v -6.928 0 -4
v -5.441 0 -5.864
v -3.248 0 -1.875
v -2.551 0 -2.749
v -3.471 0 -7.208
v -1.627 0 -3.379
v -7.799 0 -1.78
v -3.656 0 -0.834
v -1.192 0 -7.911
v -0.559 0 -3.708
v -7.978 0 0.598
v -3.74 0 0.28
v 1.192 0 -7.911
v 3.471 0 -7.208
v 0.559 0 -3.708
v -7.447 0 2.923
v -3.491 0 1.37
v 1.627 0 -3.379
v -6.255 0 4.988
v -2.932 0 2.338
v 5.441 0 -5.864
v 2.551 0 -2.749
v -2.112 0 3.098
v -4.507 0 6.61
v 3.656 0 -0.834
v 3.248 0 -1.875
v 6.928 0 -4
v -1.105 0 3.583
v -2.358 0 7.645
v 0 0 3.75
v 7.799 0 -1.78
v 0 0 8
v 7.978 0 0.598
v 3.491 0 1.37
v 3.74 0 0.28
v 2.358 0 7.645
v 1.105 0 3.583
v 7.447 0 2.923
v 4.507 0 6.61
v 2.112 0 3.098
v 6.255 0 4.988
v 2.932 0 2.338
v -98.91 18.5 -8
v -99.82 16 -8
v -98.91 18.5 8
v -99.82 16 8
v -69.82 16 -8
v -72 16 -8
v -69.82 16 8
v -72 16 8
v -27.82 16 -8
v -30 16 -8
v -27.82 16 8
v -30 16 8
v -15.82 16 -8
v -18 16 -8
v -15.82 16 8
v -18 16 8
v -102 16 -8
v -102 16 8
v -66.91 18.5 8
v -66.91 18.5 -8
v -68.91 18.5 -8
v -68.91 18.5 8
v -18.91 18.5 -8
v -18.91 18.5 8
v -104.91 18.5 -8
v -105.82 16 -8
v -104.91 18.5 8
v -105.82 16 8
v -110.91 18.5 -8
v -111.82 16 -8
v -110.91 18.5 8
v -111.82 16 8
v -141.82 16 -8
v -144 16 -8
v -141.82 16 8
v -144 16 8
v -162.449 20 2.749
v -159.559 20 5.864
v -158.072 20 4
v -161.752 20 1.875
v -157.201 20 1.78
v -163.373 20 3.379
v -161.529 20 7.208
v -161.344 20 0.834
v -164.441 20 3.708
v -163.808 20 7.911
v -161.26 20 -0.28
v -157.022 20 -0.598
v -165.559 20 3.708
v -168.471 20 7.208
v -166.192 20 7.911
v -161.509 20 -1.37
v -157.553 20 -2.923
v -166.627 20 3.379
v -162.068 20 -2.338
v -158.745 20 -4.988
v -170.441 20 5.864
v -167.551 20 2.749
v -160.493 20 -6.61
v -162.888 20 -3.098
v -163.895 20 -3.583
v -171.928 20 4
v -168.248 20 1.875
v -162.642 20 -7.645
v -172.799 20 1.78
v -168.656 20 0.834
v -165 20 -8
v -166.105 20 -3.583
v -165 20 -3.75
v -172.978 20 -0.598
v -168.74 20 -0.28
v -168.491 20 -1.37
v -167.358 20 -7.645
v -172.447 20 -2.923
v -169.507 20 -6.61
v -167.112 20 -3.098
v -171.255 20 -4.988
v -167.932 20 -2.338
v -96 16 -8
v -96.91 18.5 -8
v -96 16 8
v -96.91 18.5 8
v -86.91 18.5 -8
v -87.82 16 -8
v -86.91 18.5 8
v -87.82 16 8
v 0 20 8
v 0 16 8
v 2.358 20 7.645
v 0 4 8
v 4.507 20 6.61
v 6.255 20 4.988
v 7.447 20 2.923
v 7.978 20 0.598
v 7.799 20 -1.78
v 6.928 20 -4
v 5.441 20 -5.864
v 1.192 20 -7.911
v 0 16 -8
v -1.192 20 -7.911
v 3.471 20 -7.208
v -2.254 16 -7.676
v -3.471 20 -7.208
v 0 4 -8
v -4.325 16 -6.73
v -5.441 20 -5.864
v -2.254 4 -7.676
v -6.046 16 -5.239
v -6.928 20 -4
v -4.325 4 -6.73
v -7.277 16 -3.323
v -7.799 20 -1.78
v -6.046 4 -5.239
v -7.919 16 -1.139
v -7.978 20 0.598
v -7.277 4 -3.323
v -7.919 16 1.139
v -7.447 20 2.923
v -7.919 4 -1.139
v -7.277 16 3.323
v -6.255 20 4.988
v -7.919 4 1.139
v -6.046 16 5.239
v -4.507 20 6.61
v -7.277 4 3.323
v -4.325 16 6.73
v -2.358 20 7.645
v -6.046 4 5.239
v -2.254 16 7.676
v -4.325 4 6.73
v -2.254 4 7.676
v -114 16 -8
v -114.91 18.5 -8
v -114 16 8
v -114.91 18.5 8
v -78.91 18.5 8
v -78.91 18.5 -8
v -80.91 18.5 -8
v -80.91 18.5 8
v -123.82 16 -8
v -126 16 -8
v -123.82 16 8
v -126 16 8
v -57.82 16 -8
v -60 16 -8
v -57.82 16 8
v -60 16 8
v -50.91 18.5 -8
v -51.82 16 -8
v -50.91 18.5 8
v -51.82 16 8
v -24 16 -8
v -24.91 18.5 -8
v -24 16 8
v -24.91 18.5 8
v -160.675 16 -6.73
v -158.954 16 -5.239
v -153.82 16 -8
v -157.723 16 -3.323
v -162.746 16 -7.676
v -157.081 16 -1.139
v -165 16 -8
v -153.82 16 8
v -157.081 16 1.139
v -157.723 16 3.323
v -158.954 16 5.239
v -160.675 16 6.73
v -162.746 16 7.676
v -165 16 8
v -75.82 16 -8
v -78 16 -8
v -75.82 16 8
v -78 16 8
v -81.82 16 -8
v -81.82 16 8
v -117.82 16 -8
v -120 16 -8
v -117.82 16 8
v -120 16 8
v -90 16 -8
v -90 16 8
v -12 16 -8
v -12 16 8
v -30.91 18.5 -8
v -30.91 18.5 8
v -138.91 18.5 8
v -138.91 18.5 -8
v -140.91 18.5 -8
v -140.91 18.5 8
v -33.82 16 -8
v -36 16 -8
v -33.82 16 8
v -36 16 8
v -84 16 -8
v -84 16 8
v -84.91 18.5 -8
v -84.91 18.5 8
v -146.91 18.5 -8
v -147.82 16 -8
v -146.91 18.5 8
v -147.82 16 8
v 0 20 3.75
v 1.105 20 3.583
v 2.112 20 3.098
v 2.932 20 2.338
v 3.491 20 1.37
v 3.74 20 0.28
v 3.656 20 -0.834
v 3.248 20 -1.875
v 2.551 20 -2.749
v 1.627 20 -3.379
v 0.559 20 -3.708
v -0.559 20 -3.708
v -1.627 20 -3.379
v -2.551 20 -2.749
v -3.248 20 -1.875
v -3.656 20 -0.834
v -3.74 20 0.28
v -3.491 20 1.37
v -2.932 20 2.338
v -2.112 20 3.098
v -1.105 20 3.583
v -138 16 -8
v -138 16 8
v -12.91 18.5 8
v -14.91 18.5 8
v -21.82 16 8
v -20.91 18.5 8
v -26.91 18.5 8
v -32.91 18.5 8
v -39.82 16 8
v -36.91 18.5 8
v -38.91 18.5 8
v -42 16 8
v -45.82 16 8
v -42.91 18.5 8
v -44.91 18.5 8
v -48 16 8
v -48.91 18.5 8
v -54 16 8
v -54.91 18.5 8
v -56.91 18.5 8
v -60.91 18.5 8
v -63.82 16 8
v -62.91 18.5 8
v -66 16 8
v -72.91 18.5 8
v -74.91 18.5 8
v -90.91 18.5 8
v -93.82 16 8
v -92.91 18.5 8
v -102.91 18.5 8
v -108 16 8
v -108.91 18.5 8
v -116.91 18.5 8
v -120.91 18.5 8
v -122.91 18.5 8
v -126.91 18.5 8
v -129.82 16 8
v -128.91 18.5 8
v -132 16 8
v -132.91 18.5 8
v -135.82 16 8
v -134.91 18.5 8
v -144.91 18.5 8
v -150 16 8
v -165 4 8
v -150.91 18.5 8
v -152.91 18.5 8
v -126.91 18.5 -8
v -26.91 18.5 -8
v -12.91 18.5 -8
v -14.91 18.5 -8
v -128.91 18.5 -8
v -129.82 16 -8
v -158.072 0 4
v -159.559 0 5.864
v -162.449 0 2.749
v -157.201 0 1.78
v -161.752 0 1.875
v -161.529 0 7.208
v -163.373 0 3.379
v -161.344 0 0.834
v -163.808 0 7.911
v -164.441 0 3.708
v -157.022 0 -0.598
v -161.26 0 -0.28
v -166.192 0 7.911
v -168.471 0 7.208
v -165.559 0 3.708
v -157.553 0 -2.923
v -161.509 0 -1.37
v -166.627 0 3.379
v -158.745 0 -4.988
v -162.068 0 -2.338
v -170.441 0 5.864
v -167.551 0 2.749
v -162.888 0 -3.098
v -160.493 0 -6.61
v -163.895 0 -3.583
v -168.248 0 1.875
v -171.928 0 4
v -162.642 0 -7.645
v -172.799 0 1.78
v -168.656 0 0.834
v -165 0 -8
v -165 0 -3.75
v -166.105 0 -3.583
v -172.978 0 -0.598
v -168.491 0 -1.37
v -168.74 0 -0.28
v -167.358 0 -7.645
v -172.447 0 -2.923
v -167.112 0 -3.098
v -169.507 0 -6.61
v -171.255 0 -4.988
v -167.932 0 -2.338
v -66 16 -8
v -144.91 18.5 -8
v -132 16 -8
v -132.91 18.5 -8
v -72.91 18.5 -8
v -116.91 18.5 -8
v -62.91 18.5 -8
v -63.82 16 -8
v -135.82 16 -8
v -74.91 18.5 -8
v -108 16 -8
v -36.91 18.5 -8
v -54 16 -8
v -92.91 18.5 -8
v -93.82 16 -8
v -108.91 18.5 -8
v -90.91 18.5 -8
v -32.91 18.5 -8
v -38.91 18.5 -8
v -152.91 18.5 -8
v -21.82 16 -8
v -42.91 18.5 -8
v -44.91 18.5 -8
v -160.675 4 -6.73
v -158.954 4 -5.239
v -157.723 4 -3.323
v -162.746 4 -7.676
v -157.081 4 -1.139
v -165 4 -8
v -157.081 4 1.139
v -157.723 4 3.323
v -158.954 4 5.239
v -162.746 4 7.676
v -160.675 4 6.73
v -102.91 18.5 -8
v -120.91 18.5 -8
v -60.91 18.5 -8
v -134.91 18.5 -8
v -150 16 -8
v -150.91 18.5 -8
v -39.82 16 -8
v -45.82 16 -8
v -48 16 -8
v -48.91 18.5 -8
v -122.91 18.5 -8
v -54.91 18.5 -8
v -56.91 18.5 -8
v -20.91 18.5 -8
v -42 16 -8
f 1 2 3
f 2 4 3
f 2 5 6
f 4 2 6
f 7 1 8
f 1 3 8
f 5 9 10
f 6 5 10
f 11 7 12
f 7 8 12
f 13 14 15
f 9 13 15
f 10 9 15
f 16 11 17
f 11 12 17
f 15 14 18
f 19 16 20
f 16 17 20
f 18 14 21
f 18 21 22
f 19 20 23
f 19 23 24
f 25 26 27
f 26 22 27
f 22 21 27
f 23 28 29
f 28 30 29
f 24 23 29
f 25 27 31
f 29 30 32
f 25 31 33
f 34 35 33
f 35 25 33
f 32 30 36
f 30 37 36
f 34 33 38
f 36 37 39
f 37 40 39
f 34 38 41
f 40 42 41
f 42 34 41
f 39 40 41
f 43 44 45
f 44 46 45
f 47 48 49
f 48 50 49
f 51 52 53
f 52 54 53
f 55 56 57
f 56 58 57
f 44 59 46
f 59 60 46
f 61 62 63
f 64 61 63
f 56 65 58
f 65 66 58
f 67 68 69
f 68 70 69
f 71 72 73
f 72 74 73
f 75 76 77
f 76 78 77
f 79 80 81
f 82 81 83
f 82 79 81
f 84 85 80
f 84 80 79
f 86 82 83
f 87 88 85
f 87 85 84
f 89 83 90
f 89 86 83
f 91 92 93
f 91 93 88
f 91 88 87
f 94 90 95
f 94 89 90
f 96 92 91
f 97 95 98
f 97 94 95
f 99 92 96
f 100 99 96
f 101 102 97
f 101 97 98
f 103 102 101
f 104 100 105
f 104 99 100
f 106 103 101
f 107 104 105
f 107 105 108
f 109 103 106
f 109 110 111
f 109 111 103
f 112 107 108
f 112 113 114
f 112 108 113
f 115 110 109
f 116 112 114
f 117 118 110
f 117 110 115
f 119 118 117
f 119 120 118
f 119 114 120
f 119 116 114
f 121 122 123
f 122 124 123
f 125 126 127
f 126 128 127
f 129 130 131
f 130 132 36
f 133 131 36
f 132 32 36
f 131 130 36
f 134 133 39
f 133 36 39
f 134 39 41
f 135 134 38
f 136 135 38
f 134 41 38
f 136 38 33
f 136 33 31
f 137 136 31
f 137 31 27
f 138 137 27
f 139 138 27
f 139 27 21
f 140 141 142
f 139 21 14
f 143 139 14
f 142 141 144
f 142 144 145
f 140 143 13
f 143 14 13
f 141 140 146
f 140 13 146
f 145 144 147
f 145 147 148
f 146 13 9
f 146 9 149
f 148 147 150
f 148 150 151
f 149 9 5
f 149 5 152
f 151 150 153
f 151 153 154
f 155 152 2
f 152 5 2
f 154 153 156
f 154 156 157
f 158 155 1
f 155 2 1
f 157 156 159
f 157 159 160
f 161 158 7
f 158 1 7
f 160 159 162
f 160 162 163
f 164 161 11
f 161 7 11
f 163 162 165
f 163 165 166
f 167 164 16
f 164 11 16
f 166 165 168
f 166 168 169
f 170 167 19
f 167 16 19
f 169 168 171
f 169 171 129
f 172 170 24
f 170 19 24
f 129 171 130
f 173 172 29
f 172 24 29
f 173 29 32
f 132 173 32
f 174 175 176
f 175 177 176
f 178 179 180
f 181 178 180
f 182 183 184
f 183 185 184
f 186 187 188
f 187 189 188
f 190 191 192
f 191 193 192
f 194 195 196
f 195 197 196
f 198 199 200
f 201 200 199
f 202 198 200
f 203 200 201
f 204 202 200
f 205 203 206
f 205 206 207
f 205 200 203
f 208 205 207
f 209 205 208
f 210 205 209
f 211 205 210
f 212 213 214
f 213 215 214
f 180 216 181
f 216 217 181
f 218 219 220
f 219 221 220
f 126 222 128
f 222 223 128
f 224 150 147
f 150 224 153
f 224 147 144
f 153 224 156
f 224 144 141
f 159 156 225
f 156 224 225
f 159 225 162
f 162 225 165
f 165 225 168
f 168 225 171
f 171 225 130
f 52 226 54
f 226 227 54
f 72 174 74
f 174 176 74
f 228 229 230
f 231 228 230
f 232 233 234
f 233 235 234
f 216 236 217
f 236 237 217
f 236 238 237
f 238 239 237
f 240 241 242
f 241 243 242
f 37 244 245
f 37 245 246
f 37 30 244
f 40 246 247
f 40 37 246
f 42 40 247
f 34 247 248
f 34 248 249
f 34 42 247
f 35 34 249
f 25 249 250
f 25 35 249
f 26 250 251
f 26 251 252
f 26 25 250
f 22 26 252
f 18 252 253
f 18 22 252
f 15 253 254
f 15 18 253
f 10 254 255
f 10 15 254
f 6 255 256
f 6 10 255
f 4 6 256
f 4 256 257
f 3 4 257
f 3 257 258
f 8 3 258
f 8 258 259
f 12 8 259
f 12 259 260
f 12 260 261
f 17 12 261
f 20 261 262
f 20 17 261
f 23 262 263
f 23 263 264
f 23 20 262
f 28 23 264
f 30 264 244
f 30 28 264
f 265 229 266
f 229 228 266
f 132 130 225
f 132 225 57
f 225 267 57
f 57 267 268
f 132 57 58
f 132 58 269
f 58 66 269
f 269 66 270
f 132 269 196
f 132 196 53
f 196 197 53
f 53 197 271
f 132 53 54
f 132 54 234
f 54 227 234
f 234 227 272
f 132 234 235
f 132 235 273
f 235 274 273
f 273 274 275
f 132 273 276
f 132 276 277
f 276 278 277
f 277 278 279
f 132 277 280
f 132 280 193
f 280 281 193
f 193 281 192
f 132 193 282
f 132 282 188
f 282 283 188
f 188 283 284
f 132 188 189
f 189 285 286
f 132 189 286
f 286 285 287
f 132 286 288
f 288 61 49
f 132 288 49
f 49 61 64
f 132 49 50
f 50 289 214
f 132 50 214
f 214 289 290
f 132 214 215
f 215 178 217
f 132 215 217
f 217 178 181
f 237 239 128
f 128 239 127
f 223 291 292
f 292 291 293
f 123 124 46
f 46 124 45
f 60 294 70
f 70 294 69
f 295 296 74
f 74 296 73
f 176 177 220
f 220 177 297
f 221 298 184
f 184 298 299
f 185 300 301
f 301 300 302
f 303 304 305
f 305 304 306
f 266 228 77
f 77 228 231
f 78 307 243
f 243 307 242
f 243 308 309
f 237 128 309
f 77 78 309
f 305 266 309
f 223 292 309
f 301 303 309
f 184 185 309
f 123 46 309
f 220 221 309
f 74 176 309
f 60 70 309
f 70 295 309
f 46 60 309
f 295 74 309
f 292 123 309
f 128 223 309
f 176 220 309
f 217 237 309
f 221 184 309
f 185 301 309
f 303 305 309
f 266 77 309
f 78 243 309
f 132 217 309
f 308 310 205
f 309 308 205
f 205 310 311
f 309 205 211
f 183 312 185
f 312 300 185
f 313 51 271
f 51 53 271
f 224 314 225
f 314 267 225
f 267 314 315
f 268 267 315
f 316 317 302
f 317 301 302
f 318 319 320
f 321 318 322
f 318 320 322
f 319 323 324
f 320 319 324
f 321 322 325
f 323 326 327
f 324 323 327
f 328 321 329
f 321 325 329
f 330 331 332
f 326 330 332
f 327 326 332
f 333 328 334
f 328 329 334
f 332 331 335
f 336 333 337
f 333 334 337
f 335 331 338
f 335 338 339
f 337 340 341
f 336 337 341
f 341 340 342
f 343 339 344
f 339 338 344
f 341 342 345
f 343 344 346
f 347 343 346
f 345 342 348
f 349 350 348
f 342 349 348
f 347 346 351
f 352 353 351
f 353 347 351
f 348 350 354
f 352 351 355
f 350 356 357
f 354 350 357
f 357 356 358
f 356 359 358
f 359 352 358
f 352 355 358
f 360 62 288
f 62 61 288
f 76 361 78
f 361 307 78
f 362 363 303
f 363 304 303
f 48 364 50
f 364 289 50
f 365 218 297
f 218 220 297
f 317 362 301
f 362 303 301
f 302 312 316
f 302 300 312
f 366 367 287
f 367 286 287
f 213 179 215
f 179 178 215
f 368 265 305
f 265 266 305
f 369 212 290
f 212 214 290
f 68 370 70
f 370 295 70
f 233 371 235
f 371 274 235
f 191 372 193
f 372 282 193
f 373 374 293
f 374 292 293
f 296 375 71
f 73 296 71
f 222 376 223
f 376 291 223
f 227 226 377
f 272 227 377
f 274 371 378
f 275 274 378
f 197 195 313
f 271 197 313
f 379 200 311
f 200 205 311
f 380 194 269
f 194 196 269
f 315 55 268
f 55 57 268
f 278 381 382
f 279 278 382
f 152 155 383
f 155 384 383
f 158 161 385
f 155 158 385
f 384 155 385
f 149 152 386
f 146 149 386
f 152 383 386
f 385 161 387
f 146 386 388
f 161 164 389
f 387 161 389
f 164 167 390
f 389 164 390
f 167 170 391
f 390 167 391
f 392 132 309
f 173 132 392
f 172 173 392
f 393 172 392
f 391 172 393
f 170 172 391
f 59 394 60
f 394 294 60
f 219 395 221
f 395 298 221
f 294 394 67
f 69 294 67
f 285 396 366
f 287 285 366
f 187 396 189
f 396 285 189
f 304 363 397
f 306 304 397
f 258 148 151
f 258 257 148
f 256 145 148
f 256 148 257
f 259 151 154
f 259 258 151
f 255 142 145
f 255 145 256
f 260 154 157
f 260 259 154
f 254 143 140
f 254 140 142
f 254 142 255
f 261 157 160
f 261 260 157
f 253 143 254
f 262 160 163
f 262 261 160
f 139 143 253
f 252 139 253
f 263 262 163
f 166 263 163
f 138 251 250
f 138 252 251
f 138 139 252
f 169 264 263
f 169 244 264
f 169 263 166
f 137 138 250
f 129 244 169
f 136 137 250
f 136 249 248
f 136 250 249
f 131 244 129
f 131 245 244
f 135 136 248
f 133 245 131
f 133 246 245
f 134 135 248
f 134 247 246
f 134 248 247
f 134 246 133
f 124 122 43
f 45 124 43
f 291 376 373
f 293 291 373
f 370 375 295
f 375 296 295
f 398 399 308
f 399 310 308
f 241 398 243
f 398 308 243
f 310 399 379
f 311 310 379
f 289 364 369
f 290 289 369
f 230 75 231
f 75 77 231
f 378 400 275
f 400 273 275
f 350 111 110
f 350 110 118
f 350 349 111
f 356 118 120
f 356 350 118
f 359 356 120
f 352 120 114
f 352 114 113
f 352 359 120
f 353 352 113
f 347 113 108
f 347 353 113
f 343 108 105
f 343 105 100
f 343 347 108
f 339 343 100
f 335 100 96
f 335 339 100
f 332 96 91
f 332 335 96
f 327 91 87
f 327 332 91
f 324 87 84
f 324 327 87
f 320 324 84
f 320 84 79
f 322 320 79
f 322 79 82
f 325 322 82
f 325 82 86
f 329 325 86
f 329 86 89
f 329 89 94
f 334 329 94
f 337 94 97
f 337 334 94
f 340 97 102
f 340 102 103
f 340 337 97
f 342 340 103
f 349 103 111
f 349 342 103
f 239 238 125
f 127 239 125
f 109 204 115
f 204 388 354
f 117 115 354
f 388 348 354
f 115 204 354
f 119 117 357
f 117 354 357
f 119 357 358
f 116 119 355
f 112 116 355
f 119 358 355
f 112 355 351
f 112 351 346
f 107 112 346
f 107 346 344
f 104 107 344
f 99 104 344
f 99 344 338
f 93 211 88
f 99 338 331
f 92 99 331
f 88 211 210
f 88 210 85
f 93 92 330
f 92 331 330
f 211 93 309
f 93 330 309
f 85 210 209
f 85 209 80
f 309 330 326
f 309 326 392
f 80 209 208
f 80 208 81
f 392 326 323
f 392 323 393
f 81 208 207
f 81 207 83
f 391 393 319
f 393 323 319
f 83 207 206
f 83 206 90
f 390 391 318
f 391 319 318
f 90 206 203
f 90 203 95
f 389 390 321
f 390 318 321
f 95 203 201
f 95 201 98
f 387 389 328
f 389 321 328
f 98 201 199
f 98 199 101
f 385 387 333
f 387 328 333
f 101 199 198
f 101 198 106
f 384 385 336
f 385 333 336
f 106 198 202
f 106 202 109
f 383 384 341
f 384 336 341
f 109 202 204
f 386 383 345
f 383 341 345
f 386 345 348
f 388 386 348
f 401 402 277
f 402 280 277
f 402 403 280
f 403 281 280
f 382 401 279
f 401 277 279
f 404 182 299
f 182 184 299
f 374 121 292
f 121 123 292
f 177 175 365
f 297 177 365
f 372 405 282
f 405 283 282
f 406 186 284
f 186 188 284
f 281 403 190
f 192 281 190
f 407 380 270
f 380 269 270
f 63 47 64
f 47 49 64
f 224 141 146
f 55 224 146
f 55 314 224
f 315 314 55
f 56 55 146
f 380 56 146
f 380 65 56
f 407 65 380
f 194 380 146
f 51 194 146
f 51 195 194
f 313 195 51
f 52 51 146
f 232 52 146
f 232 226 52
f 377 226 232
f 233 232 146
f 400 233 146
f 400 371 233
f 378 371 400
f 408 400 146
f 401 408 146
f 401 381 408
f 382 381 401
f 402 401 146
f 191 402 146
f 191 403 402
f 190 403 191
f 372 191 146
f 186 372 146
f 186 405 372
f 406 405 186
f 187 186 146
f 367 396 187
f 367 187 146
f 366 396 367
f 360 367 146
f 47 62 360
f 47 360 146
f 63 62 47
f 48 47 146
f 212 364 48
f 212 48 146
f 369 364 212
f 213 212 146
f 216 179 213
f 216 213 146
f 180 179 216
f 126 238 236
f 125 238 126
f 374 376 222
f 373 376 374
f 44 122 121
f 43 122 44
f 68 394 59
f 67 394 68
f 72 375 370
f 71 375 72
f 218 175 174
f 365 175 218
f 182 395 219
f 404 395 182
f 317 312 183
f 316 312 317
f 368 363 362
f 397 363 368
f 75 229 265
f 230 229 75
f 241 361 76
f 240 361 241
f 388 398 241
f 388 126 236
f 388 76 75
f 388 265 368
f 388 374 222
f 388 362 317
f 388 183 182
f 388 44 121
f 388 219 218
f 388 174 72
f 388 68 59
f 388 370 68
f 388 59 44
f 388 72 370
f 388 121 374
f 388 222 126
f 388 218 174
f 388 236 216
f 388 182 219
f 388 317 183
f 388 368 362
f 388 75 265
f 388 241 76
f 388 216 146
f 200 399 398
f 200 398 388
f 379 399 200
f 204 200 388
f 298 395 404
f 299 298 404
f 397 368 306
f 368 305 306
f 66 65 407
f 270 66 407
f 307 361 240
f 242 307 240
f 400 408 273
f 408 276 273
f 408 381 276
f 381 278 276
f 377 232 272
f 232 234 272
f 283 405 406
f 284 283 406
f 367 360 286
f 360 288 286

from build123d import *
from build123d.topology import SkipClean

# Parameters (mm, degrees)
SKETCH1_R             = 8
SKETCH1_R_2           = 3.75
BOSS_EXTRUDE1_DEPTH   = 20
BOSS_EXTRUDE1_2_DEPTH = 20
BOSS_EXTRUDE2_DEPTH   = 8
SKETCH1_4_R           = 8
SKETCH1_4_R_2         = 3.75
BOSS_EXTRUDE3_DEPTH   = 16
SKETCH3_R             = 3.75
CUT_EXTRUDE2_DEPTH    = 16
SKETCH4_R             = 3.75
CUT_EXTRUDE3_DEPTH    = 16


with BuildPart() as part:
    # Sketch1 → Boss-Extrude1 (new body)
    with BuildSketch(Plane(origin=(0, 0, 0), x_dir=(1, 0, 0), z_dir=(0, 1, 0))):
        Circle(SKETCH1_R)
        Circle(SKETCH1_R_2, mode=Mode.SUBTRACT)
    extrude(amount=BOSS_EXTRUDE1_DEPTH)



with BuildPart() as body_2:
    # Sketch1 → Boss-Extrude1 2 (new body)
    with BuildSketch(Plane(origin=(0, 0, 0), x_dir=(1, 0, 0), z_dir=(0, 1, 0))):
        with Locations((-165, 0)):
            Circle(SKETCH1_R)
        with Locations((-165, 0)):
            Circle(SKETCH1_R_2, mode=Mode.SUBTRACT)
    extrude(amount=BOSS_EXTRUDE1_2_DEPTH)


with BuildPart() as part_1:
    add(part.part)

    add(body_2.part)  # Boss-Extrude2 merges body 2
    # Sketch2 → Boss-Extrude2 (add, symmetric)
    with BuildSketch(Plane.XY):
        Polygon((0, 4), (-165, 4), (-165, 11.640611033), (-165, 16), (-157, 16), (-153.819851171, 16), (-152.909925586, 18.5), (-151.909925586, 18.5), (-150.909925586, 18.5), (-150, 16), (-147.819851171, 16), (-146.909925586, 18.5), (-145.909925586, 18.5), (-144.909925586, 18.5), (-144, 16), (-141.819851171, 16), (-140.909925586, 18.5), (-139.909925586, 18.5), (-138.909925586, 18.5), (-138, 16), (-135.819851171, 16), (-134.909925586, 18.5), (-133.909925586, 18.5), (-132.909925586, 18.5), (-132, 16), (-129.819851171, 16), (-128.909925586, 18.5), (-127.909925586, 18.5), (-126.909925586, 18.5), (-126, 16), (-123.819851171, 16), (-122.909925586, 18.5), (-121.909925586, 18.5), (-120.909925586, 18.5), (-120, 16), (-117.819851171, 16), (-116.909925586, 18.5), (-115.909925586, 18.5), (-114.909925586, 18.5), (-114, 16), (-111.819851171, 16), (-110.909925586, 18.5), (-109.909925586, 18.5), (-108.909925586, 18.5), (-108, 16), (-105.819851171, 16), (-104.909925586, 18.5), (-103.909925586, 18.5), (-102.909925586, 18.5), (-102, 16), (-99.819851171, 16), (-98.909925586, 18.5), (-97.909925586, 18.5), (-96.909925586, 18.5), (-96, 16), (-93.819851171, 16), (-92.909925586, 18.5), (-91.909925586, 18.5), (-90.909925586, 18.5), (-90, 16), (-87.819851171, 16), (-86.909925586, 18.5), (-85.909925586, 18.5), (-84.909925586, 18.5), (-84, 16), (-81.819851171, 16), (-80.909925586, 18.5), (-79.909925586, 18.5), (-78.909925586, 18.5), (-78, 16), (-75.819851171, 16), (-74.909925586, 18.5), (-73.909925586, 18.5), (-72.909925586, 18.5), (-72, 16), (-69.819851171, 16), (-68.909925586, 18.5), (-67.909925586, 18.5), (-66.909925586, 18.5), (-66, 16), (-63.819851171, 16), (-62.909925586, 18.5), (-61.909925586, 18.5), (-60.909925586, 18.5), (-60, 16), (-57.819851171, 16), (-56.909925586, 18.5), (-55.909925586, 18.5), (-54.909925586, 18.5), (-54, 16), (-51.819851171, 16), (-50.909925586, 18.5), (-49.909925586, 18.5), (-48.909925586, 18.5), (-48, 16), (-45.819851171, 16), (-44.909925586, 18.5), (-43.909925586, 18.5), (-42.909925586, 18.5), (-42, 16), (-39.819851171, 16), (-38.909925586, 18.5), (-37.909925586, 18.5), (-36.909925586, 18.5), (-36, 16), (-33.819851171, 16), (-32.909925586, 18.5), (-31.909925586, 18.5), (-30.909925586, 18.5), (-30, 16), (-27.819851171, 16), (-26.909925586, 18.5), (-25.909925586, 18.5), (-24.909925586, 18.5), (-24, 16), (-21.819851171, 16), (-20.909925586, 18.5), (-19.909925586, 18.5), (-18.909925586, 18.5), (-18, 16), (-15.819851171, 16), (-14.909925586, 18.5), (-13.909925586, 18.5), (-12.909925586, 18.5), (-12, 16), (0, 16), align=None)
    extrude(amount=BOSS_EXTRUDE2_DEPTH, both=True)

    # Sketch1<4> → Boss-Extrude3 (add)
    # profile 1 of 2: a face of its own
    with BuildSketch(Plane(origin=(0, 0, 0), x_dir=(1, 0, 0), z_dir=(0, 1, 0))):
        Circle(SKETCH1_4_R)
        Circle(SKETCH1_4_R_2, mode=Mode.SUBTRACT)
    # profile 2 of 2: a face of its own
    with BuildSketch(Plane(origin=(0, 0, 0), x_dir=(1, 0, 0), z_dir=(0, 1, 0))):
        with Locations((-165, 0)):
            Circle(SKETCH1_4_R)
        with Locations((-165, 0)):
            Circle(SKETCH1_4_R_2, mode=Mode.SUBTRACT)
    extrude(amount=BOSS_EXTRUDE3_DEPTH)

    # Sketch3 → Cut-Extrude2 (cut)
    with SkipClean():  # the faces are left unmerged after this step: merging them gives an invalid solid
        with BuildSketch(Plane(origin=(0, 0, 0), x_dir=(-1, 0, 0), z_dir=(0, -1, 0))):
            with Locations((165, 0)):
                Circle(SKETCH3_R)
        extrude(amount=-CUT_EXTRUDE2_DEPTH, mode=Mode.SUBTRACT)

    # Sketch4 → Cut-Extrude3 (cut)
    with SkipClean():  # the faces are left unmerged after this step: merging them gives an invalid solid
        with BuildSketch(Plane(origin=(0, 0, 0), x_dir=(-1, 0, 0), z_dir=(0, -1, 0))):
            Circle(SKETCH4_R)
        extrude(amount=-CUT_EXTRUDE3_DEPTH, mode=Mode.SUBTRACT)


solid = part_1.part
